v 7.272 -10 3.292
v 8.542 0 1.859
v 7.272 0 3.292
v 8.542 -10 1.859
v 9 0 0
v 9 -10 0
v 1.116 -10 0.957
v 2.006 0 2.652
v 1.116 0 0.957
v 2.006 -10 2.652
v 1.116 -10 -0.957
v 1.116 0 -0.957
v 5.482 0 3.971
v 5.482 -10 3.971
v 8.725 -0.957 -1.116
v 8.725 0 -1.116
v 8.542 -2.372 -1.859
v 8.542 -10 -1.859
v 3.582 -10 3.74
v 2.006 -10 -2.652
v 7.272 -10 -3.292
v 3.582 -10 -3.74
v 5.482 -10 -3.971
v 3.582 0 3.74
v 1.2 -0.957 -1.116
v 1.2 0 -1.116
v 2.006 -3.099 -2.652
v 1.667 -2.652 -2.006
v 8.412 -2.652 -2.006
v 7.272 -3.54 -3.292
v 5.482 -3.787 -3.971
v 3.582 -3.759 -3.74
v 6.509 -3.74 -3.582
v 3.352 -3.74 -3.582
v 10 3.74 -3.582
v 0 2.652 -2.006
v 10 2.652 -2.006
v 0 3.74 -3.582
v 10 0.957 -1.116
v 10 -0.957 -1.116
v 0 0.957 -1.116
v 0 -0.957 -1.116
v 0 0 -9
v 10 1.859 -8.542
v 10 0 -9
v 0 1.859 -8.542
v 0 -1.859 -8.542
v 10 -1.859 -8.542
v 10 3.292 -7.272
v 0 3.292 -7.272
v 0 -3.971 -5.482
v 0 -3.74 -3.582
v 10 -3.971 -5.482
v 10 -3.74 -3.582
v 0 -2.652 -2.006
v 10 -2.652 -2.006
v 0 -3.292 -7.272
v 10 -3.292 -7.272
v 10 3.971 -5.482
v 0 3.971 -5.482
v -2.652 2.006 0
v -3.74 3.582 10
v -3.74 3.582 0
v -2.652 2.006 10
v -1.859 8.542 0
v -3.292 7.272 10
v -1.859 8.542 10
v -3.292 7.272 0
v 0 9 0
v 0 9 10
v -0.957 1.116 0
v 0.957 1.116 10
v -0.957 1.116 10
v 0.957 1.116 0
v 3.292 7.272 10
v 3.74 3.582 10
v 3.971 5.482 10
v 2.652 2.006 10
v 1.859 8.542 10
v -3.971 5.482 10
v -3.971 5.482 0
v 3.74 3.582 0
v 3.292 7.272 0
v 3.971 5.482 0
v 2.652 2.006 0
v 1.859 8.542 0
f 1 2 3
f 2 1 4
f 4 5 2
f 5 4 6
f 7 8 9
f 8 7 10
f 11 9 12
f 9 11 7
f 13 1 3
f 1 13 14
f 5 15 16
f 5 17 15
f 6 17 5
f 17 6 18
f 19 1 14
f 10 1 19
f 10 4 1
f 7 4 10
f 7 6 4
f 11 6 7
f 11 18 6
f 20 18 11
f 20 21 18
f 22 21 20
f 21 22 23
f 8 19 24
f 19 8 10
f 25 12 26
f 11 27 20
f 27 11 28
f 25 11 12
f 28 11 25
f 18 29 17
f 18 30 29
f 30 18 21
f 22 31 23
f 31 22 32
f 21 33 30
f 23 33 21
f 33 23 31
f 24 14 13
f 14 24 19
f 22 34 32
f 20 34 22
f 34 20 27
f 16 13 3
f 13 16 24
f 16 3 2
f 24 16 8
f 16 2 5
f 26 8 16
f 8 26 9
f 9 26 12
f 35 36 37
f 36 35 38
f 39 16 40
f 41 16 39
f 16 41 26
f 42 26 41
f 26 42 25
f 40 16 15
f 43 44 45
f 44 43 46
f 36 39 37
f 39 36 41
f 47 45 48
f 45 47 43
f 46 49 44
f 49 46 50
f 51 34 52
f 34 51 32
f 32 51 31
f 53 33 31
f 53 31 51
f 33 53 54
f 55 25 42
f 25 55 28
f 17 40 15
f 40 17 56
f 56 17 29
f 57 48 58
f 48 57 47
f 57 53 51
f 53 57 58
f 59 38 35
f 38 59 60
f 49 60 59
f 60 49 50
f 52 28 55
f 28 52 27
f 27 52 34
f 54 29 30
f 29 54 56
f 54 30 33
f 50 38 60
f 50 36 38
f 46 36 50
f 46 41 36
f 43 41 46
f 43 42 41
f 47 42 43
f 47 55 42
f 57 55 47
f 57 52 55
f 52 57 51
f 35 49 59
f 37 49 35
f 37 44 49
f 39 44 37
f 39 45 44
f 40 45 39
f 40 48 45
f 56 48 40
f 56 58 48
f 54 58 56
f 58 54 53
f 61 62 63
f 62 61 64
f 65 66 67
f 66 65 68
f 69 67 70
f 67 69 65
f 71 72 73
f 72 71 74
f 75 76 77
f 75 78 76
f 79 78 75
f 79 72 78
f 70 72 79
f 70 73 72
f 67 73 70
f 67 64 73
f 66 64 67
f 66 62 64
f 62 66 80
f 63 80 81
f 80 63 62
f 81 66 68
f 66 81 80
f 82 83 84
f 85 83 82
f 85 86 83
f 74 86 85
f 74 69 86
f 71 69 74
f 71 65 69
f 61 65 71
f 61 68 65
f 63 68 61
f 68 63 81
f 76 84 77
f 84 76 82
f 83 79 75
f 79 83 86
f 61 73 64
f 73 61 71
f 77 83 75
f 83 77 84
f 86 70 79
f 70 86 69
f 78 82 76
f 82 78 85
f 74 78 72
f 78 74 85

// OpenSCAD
rotate([90, 0, 0]) translate([5, 0, 0]) cylinder(h=10, r=4);
rotate([0, 90, 0]) translate([5, 0, 0]) cylinder(h=10, r=4);
rotate([0, 0, 90]) translate([5, 0, 0]) cylinder(h=10, r=4);
